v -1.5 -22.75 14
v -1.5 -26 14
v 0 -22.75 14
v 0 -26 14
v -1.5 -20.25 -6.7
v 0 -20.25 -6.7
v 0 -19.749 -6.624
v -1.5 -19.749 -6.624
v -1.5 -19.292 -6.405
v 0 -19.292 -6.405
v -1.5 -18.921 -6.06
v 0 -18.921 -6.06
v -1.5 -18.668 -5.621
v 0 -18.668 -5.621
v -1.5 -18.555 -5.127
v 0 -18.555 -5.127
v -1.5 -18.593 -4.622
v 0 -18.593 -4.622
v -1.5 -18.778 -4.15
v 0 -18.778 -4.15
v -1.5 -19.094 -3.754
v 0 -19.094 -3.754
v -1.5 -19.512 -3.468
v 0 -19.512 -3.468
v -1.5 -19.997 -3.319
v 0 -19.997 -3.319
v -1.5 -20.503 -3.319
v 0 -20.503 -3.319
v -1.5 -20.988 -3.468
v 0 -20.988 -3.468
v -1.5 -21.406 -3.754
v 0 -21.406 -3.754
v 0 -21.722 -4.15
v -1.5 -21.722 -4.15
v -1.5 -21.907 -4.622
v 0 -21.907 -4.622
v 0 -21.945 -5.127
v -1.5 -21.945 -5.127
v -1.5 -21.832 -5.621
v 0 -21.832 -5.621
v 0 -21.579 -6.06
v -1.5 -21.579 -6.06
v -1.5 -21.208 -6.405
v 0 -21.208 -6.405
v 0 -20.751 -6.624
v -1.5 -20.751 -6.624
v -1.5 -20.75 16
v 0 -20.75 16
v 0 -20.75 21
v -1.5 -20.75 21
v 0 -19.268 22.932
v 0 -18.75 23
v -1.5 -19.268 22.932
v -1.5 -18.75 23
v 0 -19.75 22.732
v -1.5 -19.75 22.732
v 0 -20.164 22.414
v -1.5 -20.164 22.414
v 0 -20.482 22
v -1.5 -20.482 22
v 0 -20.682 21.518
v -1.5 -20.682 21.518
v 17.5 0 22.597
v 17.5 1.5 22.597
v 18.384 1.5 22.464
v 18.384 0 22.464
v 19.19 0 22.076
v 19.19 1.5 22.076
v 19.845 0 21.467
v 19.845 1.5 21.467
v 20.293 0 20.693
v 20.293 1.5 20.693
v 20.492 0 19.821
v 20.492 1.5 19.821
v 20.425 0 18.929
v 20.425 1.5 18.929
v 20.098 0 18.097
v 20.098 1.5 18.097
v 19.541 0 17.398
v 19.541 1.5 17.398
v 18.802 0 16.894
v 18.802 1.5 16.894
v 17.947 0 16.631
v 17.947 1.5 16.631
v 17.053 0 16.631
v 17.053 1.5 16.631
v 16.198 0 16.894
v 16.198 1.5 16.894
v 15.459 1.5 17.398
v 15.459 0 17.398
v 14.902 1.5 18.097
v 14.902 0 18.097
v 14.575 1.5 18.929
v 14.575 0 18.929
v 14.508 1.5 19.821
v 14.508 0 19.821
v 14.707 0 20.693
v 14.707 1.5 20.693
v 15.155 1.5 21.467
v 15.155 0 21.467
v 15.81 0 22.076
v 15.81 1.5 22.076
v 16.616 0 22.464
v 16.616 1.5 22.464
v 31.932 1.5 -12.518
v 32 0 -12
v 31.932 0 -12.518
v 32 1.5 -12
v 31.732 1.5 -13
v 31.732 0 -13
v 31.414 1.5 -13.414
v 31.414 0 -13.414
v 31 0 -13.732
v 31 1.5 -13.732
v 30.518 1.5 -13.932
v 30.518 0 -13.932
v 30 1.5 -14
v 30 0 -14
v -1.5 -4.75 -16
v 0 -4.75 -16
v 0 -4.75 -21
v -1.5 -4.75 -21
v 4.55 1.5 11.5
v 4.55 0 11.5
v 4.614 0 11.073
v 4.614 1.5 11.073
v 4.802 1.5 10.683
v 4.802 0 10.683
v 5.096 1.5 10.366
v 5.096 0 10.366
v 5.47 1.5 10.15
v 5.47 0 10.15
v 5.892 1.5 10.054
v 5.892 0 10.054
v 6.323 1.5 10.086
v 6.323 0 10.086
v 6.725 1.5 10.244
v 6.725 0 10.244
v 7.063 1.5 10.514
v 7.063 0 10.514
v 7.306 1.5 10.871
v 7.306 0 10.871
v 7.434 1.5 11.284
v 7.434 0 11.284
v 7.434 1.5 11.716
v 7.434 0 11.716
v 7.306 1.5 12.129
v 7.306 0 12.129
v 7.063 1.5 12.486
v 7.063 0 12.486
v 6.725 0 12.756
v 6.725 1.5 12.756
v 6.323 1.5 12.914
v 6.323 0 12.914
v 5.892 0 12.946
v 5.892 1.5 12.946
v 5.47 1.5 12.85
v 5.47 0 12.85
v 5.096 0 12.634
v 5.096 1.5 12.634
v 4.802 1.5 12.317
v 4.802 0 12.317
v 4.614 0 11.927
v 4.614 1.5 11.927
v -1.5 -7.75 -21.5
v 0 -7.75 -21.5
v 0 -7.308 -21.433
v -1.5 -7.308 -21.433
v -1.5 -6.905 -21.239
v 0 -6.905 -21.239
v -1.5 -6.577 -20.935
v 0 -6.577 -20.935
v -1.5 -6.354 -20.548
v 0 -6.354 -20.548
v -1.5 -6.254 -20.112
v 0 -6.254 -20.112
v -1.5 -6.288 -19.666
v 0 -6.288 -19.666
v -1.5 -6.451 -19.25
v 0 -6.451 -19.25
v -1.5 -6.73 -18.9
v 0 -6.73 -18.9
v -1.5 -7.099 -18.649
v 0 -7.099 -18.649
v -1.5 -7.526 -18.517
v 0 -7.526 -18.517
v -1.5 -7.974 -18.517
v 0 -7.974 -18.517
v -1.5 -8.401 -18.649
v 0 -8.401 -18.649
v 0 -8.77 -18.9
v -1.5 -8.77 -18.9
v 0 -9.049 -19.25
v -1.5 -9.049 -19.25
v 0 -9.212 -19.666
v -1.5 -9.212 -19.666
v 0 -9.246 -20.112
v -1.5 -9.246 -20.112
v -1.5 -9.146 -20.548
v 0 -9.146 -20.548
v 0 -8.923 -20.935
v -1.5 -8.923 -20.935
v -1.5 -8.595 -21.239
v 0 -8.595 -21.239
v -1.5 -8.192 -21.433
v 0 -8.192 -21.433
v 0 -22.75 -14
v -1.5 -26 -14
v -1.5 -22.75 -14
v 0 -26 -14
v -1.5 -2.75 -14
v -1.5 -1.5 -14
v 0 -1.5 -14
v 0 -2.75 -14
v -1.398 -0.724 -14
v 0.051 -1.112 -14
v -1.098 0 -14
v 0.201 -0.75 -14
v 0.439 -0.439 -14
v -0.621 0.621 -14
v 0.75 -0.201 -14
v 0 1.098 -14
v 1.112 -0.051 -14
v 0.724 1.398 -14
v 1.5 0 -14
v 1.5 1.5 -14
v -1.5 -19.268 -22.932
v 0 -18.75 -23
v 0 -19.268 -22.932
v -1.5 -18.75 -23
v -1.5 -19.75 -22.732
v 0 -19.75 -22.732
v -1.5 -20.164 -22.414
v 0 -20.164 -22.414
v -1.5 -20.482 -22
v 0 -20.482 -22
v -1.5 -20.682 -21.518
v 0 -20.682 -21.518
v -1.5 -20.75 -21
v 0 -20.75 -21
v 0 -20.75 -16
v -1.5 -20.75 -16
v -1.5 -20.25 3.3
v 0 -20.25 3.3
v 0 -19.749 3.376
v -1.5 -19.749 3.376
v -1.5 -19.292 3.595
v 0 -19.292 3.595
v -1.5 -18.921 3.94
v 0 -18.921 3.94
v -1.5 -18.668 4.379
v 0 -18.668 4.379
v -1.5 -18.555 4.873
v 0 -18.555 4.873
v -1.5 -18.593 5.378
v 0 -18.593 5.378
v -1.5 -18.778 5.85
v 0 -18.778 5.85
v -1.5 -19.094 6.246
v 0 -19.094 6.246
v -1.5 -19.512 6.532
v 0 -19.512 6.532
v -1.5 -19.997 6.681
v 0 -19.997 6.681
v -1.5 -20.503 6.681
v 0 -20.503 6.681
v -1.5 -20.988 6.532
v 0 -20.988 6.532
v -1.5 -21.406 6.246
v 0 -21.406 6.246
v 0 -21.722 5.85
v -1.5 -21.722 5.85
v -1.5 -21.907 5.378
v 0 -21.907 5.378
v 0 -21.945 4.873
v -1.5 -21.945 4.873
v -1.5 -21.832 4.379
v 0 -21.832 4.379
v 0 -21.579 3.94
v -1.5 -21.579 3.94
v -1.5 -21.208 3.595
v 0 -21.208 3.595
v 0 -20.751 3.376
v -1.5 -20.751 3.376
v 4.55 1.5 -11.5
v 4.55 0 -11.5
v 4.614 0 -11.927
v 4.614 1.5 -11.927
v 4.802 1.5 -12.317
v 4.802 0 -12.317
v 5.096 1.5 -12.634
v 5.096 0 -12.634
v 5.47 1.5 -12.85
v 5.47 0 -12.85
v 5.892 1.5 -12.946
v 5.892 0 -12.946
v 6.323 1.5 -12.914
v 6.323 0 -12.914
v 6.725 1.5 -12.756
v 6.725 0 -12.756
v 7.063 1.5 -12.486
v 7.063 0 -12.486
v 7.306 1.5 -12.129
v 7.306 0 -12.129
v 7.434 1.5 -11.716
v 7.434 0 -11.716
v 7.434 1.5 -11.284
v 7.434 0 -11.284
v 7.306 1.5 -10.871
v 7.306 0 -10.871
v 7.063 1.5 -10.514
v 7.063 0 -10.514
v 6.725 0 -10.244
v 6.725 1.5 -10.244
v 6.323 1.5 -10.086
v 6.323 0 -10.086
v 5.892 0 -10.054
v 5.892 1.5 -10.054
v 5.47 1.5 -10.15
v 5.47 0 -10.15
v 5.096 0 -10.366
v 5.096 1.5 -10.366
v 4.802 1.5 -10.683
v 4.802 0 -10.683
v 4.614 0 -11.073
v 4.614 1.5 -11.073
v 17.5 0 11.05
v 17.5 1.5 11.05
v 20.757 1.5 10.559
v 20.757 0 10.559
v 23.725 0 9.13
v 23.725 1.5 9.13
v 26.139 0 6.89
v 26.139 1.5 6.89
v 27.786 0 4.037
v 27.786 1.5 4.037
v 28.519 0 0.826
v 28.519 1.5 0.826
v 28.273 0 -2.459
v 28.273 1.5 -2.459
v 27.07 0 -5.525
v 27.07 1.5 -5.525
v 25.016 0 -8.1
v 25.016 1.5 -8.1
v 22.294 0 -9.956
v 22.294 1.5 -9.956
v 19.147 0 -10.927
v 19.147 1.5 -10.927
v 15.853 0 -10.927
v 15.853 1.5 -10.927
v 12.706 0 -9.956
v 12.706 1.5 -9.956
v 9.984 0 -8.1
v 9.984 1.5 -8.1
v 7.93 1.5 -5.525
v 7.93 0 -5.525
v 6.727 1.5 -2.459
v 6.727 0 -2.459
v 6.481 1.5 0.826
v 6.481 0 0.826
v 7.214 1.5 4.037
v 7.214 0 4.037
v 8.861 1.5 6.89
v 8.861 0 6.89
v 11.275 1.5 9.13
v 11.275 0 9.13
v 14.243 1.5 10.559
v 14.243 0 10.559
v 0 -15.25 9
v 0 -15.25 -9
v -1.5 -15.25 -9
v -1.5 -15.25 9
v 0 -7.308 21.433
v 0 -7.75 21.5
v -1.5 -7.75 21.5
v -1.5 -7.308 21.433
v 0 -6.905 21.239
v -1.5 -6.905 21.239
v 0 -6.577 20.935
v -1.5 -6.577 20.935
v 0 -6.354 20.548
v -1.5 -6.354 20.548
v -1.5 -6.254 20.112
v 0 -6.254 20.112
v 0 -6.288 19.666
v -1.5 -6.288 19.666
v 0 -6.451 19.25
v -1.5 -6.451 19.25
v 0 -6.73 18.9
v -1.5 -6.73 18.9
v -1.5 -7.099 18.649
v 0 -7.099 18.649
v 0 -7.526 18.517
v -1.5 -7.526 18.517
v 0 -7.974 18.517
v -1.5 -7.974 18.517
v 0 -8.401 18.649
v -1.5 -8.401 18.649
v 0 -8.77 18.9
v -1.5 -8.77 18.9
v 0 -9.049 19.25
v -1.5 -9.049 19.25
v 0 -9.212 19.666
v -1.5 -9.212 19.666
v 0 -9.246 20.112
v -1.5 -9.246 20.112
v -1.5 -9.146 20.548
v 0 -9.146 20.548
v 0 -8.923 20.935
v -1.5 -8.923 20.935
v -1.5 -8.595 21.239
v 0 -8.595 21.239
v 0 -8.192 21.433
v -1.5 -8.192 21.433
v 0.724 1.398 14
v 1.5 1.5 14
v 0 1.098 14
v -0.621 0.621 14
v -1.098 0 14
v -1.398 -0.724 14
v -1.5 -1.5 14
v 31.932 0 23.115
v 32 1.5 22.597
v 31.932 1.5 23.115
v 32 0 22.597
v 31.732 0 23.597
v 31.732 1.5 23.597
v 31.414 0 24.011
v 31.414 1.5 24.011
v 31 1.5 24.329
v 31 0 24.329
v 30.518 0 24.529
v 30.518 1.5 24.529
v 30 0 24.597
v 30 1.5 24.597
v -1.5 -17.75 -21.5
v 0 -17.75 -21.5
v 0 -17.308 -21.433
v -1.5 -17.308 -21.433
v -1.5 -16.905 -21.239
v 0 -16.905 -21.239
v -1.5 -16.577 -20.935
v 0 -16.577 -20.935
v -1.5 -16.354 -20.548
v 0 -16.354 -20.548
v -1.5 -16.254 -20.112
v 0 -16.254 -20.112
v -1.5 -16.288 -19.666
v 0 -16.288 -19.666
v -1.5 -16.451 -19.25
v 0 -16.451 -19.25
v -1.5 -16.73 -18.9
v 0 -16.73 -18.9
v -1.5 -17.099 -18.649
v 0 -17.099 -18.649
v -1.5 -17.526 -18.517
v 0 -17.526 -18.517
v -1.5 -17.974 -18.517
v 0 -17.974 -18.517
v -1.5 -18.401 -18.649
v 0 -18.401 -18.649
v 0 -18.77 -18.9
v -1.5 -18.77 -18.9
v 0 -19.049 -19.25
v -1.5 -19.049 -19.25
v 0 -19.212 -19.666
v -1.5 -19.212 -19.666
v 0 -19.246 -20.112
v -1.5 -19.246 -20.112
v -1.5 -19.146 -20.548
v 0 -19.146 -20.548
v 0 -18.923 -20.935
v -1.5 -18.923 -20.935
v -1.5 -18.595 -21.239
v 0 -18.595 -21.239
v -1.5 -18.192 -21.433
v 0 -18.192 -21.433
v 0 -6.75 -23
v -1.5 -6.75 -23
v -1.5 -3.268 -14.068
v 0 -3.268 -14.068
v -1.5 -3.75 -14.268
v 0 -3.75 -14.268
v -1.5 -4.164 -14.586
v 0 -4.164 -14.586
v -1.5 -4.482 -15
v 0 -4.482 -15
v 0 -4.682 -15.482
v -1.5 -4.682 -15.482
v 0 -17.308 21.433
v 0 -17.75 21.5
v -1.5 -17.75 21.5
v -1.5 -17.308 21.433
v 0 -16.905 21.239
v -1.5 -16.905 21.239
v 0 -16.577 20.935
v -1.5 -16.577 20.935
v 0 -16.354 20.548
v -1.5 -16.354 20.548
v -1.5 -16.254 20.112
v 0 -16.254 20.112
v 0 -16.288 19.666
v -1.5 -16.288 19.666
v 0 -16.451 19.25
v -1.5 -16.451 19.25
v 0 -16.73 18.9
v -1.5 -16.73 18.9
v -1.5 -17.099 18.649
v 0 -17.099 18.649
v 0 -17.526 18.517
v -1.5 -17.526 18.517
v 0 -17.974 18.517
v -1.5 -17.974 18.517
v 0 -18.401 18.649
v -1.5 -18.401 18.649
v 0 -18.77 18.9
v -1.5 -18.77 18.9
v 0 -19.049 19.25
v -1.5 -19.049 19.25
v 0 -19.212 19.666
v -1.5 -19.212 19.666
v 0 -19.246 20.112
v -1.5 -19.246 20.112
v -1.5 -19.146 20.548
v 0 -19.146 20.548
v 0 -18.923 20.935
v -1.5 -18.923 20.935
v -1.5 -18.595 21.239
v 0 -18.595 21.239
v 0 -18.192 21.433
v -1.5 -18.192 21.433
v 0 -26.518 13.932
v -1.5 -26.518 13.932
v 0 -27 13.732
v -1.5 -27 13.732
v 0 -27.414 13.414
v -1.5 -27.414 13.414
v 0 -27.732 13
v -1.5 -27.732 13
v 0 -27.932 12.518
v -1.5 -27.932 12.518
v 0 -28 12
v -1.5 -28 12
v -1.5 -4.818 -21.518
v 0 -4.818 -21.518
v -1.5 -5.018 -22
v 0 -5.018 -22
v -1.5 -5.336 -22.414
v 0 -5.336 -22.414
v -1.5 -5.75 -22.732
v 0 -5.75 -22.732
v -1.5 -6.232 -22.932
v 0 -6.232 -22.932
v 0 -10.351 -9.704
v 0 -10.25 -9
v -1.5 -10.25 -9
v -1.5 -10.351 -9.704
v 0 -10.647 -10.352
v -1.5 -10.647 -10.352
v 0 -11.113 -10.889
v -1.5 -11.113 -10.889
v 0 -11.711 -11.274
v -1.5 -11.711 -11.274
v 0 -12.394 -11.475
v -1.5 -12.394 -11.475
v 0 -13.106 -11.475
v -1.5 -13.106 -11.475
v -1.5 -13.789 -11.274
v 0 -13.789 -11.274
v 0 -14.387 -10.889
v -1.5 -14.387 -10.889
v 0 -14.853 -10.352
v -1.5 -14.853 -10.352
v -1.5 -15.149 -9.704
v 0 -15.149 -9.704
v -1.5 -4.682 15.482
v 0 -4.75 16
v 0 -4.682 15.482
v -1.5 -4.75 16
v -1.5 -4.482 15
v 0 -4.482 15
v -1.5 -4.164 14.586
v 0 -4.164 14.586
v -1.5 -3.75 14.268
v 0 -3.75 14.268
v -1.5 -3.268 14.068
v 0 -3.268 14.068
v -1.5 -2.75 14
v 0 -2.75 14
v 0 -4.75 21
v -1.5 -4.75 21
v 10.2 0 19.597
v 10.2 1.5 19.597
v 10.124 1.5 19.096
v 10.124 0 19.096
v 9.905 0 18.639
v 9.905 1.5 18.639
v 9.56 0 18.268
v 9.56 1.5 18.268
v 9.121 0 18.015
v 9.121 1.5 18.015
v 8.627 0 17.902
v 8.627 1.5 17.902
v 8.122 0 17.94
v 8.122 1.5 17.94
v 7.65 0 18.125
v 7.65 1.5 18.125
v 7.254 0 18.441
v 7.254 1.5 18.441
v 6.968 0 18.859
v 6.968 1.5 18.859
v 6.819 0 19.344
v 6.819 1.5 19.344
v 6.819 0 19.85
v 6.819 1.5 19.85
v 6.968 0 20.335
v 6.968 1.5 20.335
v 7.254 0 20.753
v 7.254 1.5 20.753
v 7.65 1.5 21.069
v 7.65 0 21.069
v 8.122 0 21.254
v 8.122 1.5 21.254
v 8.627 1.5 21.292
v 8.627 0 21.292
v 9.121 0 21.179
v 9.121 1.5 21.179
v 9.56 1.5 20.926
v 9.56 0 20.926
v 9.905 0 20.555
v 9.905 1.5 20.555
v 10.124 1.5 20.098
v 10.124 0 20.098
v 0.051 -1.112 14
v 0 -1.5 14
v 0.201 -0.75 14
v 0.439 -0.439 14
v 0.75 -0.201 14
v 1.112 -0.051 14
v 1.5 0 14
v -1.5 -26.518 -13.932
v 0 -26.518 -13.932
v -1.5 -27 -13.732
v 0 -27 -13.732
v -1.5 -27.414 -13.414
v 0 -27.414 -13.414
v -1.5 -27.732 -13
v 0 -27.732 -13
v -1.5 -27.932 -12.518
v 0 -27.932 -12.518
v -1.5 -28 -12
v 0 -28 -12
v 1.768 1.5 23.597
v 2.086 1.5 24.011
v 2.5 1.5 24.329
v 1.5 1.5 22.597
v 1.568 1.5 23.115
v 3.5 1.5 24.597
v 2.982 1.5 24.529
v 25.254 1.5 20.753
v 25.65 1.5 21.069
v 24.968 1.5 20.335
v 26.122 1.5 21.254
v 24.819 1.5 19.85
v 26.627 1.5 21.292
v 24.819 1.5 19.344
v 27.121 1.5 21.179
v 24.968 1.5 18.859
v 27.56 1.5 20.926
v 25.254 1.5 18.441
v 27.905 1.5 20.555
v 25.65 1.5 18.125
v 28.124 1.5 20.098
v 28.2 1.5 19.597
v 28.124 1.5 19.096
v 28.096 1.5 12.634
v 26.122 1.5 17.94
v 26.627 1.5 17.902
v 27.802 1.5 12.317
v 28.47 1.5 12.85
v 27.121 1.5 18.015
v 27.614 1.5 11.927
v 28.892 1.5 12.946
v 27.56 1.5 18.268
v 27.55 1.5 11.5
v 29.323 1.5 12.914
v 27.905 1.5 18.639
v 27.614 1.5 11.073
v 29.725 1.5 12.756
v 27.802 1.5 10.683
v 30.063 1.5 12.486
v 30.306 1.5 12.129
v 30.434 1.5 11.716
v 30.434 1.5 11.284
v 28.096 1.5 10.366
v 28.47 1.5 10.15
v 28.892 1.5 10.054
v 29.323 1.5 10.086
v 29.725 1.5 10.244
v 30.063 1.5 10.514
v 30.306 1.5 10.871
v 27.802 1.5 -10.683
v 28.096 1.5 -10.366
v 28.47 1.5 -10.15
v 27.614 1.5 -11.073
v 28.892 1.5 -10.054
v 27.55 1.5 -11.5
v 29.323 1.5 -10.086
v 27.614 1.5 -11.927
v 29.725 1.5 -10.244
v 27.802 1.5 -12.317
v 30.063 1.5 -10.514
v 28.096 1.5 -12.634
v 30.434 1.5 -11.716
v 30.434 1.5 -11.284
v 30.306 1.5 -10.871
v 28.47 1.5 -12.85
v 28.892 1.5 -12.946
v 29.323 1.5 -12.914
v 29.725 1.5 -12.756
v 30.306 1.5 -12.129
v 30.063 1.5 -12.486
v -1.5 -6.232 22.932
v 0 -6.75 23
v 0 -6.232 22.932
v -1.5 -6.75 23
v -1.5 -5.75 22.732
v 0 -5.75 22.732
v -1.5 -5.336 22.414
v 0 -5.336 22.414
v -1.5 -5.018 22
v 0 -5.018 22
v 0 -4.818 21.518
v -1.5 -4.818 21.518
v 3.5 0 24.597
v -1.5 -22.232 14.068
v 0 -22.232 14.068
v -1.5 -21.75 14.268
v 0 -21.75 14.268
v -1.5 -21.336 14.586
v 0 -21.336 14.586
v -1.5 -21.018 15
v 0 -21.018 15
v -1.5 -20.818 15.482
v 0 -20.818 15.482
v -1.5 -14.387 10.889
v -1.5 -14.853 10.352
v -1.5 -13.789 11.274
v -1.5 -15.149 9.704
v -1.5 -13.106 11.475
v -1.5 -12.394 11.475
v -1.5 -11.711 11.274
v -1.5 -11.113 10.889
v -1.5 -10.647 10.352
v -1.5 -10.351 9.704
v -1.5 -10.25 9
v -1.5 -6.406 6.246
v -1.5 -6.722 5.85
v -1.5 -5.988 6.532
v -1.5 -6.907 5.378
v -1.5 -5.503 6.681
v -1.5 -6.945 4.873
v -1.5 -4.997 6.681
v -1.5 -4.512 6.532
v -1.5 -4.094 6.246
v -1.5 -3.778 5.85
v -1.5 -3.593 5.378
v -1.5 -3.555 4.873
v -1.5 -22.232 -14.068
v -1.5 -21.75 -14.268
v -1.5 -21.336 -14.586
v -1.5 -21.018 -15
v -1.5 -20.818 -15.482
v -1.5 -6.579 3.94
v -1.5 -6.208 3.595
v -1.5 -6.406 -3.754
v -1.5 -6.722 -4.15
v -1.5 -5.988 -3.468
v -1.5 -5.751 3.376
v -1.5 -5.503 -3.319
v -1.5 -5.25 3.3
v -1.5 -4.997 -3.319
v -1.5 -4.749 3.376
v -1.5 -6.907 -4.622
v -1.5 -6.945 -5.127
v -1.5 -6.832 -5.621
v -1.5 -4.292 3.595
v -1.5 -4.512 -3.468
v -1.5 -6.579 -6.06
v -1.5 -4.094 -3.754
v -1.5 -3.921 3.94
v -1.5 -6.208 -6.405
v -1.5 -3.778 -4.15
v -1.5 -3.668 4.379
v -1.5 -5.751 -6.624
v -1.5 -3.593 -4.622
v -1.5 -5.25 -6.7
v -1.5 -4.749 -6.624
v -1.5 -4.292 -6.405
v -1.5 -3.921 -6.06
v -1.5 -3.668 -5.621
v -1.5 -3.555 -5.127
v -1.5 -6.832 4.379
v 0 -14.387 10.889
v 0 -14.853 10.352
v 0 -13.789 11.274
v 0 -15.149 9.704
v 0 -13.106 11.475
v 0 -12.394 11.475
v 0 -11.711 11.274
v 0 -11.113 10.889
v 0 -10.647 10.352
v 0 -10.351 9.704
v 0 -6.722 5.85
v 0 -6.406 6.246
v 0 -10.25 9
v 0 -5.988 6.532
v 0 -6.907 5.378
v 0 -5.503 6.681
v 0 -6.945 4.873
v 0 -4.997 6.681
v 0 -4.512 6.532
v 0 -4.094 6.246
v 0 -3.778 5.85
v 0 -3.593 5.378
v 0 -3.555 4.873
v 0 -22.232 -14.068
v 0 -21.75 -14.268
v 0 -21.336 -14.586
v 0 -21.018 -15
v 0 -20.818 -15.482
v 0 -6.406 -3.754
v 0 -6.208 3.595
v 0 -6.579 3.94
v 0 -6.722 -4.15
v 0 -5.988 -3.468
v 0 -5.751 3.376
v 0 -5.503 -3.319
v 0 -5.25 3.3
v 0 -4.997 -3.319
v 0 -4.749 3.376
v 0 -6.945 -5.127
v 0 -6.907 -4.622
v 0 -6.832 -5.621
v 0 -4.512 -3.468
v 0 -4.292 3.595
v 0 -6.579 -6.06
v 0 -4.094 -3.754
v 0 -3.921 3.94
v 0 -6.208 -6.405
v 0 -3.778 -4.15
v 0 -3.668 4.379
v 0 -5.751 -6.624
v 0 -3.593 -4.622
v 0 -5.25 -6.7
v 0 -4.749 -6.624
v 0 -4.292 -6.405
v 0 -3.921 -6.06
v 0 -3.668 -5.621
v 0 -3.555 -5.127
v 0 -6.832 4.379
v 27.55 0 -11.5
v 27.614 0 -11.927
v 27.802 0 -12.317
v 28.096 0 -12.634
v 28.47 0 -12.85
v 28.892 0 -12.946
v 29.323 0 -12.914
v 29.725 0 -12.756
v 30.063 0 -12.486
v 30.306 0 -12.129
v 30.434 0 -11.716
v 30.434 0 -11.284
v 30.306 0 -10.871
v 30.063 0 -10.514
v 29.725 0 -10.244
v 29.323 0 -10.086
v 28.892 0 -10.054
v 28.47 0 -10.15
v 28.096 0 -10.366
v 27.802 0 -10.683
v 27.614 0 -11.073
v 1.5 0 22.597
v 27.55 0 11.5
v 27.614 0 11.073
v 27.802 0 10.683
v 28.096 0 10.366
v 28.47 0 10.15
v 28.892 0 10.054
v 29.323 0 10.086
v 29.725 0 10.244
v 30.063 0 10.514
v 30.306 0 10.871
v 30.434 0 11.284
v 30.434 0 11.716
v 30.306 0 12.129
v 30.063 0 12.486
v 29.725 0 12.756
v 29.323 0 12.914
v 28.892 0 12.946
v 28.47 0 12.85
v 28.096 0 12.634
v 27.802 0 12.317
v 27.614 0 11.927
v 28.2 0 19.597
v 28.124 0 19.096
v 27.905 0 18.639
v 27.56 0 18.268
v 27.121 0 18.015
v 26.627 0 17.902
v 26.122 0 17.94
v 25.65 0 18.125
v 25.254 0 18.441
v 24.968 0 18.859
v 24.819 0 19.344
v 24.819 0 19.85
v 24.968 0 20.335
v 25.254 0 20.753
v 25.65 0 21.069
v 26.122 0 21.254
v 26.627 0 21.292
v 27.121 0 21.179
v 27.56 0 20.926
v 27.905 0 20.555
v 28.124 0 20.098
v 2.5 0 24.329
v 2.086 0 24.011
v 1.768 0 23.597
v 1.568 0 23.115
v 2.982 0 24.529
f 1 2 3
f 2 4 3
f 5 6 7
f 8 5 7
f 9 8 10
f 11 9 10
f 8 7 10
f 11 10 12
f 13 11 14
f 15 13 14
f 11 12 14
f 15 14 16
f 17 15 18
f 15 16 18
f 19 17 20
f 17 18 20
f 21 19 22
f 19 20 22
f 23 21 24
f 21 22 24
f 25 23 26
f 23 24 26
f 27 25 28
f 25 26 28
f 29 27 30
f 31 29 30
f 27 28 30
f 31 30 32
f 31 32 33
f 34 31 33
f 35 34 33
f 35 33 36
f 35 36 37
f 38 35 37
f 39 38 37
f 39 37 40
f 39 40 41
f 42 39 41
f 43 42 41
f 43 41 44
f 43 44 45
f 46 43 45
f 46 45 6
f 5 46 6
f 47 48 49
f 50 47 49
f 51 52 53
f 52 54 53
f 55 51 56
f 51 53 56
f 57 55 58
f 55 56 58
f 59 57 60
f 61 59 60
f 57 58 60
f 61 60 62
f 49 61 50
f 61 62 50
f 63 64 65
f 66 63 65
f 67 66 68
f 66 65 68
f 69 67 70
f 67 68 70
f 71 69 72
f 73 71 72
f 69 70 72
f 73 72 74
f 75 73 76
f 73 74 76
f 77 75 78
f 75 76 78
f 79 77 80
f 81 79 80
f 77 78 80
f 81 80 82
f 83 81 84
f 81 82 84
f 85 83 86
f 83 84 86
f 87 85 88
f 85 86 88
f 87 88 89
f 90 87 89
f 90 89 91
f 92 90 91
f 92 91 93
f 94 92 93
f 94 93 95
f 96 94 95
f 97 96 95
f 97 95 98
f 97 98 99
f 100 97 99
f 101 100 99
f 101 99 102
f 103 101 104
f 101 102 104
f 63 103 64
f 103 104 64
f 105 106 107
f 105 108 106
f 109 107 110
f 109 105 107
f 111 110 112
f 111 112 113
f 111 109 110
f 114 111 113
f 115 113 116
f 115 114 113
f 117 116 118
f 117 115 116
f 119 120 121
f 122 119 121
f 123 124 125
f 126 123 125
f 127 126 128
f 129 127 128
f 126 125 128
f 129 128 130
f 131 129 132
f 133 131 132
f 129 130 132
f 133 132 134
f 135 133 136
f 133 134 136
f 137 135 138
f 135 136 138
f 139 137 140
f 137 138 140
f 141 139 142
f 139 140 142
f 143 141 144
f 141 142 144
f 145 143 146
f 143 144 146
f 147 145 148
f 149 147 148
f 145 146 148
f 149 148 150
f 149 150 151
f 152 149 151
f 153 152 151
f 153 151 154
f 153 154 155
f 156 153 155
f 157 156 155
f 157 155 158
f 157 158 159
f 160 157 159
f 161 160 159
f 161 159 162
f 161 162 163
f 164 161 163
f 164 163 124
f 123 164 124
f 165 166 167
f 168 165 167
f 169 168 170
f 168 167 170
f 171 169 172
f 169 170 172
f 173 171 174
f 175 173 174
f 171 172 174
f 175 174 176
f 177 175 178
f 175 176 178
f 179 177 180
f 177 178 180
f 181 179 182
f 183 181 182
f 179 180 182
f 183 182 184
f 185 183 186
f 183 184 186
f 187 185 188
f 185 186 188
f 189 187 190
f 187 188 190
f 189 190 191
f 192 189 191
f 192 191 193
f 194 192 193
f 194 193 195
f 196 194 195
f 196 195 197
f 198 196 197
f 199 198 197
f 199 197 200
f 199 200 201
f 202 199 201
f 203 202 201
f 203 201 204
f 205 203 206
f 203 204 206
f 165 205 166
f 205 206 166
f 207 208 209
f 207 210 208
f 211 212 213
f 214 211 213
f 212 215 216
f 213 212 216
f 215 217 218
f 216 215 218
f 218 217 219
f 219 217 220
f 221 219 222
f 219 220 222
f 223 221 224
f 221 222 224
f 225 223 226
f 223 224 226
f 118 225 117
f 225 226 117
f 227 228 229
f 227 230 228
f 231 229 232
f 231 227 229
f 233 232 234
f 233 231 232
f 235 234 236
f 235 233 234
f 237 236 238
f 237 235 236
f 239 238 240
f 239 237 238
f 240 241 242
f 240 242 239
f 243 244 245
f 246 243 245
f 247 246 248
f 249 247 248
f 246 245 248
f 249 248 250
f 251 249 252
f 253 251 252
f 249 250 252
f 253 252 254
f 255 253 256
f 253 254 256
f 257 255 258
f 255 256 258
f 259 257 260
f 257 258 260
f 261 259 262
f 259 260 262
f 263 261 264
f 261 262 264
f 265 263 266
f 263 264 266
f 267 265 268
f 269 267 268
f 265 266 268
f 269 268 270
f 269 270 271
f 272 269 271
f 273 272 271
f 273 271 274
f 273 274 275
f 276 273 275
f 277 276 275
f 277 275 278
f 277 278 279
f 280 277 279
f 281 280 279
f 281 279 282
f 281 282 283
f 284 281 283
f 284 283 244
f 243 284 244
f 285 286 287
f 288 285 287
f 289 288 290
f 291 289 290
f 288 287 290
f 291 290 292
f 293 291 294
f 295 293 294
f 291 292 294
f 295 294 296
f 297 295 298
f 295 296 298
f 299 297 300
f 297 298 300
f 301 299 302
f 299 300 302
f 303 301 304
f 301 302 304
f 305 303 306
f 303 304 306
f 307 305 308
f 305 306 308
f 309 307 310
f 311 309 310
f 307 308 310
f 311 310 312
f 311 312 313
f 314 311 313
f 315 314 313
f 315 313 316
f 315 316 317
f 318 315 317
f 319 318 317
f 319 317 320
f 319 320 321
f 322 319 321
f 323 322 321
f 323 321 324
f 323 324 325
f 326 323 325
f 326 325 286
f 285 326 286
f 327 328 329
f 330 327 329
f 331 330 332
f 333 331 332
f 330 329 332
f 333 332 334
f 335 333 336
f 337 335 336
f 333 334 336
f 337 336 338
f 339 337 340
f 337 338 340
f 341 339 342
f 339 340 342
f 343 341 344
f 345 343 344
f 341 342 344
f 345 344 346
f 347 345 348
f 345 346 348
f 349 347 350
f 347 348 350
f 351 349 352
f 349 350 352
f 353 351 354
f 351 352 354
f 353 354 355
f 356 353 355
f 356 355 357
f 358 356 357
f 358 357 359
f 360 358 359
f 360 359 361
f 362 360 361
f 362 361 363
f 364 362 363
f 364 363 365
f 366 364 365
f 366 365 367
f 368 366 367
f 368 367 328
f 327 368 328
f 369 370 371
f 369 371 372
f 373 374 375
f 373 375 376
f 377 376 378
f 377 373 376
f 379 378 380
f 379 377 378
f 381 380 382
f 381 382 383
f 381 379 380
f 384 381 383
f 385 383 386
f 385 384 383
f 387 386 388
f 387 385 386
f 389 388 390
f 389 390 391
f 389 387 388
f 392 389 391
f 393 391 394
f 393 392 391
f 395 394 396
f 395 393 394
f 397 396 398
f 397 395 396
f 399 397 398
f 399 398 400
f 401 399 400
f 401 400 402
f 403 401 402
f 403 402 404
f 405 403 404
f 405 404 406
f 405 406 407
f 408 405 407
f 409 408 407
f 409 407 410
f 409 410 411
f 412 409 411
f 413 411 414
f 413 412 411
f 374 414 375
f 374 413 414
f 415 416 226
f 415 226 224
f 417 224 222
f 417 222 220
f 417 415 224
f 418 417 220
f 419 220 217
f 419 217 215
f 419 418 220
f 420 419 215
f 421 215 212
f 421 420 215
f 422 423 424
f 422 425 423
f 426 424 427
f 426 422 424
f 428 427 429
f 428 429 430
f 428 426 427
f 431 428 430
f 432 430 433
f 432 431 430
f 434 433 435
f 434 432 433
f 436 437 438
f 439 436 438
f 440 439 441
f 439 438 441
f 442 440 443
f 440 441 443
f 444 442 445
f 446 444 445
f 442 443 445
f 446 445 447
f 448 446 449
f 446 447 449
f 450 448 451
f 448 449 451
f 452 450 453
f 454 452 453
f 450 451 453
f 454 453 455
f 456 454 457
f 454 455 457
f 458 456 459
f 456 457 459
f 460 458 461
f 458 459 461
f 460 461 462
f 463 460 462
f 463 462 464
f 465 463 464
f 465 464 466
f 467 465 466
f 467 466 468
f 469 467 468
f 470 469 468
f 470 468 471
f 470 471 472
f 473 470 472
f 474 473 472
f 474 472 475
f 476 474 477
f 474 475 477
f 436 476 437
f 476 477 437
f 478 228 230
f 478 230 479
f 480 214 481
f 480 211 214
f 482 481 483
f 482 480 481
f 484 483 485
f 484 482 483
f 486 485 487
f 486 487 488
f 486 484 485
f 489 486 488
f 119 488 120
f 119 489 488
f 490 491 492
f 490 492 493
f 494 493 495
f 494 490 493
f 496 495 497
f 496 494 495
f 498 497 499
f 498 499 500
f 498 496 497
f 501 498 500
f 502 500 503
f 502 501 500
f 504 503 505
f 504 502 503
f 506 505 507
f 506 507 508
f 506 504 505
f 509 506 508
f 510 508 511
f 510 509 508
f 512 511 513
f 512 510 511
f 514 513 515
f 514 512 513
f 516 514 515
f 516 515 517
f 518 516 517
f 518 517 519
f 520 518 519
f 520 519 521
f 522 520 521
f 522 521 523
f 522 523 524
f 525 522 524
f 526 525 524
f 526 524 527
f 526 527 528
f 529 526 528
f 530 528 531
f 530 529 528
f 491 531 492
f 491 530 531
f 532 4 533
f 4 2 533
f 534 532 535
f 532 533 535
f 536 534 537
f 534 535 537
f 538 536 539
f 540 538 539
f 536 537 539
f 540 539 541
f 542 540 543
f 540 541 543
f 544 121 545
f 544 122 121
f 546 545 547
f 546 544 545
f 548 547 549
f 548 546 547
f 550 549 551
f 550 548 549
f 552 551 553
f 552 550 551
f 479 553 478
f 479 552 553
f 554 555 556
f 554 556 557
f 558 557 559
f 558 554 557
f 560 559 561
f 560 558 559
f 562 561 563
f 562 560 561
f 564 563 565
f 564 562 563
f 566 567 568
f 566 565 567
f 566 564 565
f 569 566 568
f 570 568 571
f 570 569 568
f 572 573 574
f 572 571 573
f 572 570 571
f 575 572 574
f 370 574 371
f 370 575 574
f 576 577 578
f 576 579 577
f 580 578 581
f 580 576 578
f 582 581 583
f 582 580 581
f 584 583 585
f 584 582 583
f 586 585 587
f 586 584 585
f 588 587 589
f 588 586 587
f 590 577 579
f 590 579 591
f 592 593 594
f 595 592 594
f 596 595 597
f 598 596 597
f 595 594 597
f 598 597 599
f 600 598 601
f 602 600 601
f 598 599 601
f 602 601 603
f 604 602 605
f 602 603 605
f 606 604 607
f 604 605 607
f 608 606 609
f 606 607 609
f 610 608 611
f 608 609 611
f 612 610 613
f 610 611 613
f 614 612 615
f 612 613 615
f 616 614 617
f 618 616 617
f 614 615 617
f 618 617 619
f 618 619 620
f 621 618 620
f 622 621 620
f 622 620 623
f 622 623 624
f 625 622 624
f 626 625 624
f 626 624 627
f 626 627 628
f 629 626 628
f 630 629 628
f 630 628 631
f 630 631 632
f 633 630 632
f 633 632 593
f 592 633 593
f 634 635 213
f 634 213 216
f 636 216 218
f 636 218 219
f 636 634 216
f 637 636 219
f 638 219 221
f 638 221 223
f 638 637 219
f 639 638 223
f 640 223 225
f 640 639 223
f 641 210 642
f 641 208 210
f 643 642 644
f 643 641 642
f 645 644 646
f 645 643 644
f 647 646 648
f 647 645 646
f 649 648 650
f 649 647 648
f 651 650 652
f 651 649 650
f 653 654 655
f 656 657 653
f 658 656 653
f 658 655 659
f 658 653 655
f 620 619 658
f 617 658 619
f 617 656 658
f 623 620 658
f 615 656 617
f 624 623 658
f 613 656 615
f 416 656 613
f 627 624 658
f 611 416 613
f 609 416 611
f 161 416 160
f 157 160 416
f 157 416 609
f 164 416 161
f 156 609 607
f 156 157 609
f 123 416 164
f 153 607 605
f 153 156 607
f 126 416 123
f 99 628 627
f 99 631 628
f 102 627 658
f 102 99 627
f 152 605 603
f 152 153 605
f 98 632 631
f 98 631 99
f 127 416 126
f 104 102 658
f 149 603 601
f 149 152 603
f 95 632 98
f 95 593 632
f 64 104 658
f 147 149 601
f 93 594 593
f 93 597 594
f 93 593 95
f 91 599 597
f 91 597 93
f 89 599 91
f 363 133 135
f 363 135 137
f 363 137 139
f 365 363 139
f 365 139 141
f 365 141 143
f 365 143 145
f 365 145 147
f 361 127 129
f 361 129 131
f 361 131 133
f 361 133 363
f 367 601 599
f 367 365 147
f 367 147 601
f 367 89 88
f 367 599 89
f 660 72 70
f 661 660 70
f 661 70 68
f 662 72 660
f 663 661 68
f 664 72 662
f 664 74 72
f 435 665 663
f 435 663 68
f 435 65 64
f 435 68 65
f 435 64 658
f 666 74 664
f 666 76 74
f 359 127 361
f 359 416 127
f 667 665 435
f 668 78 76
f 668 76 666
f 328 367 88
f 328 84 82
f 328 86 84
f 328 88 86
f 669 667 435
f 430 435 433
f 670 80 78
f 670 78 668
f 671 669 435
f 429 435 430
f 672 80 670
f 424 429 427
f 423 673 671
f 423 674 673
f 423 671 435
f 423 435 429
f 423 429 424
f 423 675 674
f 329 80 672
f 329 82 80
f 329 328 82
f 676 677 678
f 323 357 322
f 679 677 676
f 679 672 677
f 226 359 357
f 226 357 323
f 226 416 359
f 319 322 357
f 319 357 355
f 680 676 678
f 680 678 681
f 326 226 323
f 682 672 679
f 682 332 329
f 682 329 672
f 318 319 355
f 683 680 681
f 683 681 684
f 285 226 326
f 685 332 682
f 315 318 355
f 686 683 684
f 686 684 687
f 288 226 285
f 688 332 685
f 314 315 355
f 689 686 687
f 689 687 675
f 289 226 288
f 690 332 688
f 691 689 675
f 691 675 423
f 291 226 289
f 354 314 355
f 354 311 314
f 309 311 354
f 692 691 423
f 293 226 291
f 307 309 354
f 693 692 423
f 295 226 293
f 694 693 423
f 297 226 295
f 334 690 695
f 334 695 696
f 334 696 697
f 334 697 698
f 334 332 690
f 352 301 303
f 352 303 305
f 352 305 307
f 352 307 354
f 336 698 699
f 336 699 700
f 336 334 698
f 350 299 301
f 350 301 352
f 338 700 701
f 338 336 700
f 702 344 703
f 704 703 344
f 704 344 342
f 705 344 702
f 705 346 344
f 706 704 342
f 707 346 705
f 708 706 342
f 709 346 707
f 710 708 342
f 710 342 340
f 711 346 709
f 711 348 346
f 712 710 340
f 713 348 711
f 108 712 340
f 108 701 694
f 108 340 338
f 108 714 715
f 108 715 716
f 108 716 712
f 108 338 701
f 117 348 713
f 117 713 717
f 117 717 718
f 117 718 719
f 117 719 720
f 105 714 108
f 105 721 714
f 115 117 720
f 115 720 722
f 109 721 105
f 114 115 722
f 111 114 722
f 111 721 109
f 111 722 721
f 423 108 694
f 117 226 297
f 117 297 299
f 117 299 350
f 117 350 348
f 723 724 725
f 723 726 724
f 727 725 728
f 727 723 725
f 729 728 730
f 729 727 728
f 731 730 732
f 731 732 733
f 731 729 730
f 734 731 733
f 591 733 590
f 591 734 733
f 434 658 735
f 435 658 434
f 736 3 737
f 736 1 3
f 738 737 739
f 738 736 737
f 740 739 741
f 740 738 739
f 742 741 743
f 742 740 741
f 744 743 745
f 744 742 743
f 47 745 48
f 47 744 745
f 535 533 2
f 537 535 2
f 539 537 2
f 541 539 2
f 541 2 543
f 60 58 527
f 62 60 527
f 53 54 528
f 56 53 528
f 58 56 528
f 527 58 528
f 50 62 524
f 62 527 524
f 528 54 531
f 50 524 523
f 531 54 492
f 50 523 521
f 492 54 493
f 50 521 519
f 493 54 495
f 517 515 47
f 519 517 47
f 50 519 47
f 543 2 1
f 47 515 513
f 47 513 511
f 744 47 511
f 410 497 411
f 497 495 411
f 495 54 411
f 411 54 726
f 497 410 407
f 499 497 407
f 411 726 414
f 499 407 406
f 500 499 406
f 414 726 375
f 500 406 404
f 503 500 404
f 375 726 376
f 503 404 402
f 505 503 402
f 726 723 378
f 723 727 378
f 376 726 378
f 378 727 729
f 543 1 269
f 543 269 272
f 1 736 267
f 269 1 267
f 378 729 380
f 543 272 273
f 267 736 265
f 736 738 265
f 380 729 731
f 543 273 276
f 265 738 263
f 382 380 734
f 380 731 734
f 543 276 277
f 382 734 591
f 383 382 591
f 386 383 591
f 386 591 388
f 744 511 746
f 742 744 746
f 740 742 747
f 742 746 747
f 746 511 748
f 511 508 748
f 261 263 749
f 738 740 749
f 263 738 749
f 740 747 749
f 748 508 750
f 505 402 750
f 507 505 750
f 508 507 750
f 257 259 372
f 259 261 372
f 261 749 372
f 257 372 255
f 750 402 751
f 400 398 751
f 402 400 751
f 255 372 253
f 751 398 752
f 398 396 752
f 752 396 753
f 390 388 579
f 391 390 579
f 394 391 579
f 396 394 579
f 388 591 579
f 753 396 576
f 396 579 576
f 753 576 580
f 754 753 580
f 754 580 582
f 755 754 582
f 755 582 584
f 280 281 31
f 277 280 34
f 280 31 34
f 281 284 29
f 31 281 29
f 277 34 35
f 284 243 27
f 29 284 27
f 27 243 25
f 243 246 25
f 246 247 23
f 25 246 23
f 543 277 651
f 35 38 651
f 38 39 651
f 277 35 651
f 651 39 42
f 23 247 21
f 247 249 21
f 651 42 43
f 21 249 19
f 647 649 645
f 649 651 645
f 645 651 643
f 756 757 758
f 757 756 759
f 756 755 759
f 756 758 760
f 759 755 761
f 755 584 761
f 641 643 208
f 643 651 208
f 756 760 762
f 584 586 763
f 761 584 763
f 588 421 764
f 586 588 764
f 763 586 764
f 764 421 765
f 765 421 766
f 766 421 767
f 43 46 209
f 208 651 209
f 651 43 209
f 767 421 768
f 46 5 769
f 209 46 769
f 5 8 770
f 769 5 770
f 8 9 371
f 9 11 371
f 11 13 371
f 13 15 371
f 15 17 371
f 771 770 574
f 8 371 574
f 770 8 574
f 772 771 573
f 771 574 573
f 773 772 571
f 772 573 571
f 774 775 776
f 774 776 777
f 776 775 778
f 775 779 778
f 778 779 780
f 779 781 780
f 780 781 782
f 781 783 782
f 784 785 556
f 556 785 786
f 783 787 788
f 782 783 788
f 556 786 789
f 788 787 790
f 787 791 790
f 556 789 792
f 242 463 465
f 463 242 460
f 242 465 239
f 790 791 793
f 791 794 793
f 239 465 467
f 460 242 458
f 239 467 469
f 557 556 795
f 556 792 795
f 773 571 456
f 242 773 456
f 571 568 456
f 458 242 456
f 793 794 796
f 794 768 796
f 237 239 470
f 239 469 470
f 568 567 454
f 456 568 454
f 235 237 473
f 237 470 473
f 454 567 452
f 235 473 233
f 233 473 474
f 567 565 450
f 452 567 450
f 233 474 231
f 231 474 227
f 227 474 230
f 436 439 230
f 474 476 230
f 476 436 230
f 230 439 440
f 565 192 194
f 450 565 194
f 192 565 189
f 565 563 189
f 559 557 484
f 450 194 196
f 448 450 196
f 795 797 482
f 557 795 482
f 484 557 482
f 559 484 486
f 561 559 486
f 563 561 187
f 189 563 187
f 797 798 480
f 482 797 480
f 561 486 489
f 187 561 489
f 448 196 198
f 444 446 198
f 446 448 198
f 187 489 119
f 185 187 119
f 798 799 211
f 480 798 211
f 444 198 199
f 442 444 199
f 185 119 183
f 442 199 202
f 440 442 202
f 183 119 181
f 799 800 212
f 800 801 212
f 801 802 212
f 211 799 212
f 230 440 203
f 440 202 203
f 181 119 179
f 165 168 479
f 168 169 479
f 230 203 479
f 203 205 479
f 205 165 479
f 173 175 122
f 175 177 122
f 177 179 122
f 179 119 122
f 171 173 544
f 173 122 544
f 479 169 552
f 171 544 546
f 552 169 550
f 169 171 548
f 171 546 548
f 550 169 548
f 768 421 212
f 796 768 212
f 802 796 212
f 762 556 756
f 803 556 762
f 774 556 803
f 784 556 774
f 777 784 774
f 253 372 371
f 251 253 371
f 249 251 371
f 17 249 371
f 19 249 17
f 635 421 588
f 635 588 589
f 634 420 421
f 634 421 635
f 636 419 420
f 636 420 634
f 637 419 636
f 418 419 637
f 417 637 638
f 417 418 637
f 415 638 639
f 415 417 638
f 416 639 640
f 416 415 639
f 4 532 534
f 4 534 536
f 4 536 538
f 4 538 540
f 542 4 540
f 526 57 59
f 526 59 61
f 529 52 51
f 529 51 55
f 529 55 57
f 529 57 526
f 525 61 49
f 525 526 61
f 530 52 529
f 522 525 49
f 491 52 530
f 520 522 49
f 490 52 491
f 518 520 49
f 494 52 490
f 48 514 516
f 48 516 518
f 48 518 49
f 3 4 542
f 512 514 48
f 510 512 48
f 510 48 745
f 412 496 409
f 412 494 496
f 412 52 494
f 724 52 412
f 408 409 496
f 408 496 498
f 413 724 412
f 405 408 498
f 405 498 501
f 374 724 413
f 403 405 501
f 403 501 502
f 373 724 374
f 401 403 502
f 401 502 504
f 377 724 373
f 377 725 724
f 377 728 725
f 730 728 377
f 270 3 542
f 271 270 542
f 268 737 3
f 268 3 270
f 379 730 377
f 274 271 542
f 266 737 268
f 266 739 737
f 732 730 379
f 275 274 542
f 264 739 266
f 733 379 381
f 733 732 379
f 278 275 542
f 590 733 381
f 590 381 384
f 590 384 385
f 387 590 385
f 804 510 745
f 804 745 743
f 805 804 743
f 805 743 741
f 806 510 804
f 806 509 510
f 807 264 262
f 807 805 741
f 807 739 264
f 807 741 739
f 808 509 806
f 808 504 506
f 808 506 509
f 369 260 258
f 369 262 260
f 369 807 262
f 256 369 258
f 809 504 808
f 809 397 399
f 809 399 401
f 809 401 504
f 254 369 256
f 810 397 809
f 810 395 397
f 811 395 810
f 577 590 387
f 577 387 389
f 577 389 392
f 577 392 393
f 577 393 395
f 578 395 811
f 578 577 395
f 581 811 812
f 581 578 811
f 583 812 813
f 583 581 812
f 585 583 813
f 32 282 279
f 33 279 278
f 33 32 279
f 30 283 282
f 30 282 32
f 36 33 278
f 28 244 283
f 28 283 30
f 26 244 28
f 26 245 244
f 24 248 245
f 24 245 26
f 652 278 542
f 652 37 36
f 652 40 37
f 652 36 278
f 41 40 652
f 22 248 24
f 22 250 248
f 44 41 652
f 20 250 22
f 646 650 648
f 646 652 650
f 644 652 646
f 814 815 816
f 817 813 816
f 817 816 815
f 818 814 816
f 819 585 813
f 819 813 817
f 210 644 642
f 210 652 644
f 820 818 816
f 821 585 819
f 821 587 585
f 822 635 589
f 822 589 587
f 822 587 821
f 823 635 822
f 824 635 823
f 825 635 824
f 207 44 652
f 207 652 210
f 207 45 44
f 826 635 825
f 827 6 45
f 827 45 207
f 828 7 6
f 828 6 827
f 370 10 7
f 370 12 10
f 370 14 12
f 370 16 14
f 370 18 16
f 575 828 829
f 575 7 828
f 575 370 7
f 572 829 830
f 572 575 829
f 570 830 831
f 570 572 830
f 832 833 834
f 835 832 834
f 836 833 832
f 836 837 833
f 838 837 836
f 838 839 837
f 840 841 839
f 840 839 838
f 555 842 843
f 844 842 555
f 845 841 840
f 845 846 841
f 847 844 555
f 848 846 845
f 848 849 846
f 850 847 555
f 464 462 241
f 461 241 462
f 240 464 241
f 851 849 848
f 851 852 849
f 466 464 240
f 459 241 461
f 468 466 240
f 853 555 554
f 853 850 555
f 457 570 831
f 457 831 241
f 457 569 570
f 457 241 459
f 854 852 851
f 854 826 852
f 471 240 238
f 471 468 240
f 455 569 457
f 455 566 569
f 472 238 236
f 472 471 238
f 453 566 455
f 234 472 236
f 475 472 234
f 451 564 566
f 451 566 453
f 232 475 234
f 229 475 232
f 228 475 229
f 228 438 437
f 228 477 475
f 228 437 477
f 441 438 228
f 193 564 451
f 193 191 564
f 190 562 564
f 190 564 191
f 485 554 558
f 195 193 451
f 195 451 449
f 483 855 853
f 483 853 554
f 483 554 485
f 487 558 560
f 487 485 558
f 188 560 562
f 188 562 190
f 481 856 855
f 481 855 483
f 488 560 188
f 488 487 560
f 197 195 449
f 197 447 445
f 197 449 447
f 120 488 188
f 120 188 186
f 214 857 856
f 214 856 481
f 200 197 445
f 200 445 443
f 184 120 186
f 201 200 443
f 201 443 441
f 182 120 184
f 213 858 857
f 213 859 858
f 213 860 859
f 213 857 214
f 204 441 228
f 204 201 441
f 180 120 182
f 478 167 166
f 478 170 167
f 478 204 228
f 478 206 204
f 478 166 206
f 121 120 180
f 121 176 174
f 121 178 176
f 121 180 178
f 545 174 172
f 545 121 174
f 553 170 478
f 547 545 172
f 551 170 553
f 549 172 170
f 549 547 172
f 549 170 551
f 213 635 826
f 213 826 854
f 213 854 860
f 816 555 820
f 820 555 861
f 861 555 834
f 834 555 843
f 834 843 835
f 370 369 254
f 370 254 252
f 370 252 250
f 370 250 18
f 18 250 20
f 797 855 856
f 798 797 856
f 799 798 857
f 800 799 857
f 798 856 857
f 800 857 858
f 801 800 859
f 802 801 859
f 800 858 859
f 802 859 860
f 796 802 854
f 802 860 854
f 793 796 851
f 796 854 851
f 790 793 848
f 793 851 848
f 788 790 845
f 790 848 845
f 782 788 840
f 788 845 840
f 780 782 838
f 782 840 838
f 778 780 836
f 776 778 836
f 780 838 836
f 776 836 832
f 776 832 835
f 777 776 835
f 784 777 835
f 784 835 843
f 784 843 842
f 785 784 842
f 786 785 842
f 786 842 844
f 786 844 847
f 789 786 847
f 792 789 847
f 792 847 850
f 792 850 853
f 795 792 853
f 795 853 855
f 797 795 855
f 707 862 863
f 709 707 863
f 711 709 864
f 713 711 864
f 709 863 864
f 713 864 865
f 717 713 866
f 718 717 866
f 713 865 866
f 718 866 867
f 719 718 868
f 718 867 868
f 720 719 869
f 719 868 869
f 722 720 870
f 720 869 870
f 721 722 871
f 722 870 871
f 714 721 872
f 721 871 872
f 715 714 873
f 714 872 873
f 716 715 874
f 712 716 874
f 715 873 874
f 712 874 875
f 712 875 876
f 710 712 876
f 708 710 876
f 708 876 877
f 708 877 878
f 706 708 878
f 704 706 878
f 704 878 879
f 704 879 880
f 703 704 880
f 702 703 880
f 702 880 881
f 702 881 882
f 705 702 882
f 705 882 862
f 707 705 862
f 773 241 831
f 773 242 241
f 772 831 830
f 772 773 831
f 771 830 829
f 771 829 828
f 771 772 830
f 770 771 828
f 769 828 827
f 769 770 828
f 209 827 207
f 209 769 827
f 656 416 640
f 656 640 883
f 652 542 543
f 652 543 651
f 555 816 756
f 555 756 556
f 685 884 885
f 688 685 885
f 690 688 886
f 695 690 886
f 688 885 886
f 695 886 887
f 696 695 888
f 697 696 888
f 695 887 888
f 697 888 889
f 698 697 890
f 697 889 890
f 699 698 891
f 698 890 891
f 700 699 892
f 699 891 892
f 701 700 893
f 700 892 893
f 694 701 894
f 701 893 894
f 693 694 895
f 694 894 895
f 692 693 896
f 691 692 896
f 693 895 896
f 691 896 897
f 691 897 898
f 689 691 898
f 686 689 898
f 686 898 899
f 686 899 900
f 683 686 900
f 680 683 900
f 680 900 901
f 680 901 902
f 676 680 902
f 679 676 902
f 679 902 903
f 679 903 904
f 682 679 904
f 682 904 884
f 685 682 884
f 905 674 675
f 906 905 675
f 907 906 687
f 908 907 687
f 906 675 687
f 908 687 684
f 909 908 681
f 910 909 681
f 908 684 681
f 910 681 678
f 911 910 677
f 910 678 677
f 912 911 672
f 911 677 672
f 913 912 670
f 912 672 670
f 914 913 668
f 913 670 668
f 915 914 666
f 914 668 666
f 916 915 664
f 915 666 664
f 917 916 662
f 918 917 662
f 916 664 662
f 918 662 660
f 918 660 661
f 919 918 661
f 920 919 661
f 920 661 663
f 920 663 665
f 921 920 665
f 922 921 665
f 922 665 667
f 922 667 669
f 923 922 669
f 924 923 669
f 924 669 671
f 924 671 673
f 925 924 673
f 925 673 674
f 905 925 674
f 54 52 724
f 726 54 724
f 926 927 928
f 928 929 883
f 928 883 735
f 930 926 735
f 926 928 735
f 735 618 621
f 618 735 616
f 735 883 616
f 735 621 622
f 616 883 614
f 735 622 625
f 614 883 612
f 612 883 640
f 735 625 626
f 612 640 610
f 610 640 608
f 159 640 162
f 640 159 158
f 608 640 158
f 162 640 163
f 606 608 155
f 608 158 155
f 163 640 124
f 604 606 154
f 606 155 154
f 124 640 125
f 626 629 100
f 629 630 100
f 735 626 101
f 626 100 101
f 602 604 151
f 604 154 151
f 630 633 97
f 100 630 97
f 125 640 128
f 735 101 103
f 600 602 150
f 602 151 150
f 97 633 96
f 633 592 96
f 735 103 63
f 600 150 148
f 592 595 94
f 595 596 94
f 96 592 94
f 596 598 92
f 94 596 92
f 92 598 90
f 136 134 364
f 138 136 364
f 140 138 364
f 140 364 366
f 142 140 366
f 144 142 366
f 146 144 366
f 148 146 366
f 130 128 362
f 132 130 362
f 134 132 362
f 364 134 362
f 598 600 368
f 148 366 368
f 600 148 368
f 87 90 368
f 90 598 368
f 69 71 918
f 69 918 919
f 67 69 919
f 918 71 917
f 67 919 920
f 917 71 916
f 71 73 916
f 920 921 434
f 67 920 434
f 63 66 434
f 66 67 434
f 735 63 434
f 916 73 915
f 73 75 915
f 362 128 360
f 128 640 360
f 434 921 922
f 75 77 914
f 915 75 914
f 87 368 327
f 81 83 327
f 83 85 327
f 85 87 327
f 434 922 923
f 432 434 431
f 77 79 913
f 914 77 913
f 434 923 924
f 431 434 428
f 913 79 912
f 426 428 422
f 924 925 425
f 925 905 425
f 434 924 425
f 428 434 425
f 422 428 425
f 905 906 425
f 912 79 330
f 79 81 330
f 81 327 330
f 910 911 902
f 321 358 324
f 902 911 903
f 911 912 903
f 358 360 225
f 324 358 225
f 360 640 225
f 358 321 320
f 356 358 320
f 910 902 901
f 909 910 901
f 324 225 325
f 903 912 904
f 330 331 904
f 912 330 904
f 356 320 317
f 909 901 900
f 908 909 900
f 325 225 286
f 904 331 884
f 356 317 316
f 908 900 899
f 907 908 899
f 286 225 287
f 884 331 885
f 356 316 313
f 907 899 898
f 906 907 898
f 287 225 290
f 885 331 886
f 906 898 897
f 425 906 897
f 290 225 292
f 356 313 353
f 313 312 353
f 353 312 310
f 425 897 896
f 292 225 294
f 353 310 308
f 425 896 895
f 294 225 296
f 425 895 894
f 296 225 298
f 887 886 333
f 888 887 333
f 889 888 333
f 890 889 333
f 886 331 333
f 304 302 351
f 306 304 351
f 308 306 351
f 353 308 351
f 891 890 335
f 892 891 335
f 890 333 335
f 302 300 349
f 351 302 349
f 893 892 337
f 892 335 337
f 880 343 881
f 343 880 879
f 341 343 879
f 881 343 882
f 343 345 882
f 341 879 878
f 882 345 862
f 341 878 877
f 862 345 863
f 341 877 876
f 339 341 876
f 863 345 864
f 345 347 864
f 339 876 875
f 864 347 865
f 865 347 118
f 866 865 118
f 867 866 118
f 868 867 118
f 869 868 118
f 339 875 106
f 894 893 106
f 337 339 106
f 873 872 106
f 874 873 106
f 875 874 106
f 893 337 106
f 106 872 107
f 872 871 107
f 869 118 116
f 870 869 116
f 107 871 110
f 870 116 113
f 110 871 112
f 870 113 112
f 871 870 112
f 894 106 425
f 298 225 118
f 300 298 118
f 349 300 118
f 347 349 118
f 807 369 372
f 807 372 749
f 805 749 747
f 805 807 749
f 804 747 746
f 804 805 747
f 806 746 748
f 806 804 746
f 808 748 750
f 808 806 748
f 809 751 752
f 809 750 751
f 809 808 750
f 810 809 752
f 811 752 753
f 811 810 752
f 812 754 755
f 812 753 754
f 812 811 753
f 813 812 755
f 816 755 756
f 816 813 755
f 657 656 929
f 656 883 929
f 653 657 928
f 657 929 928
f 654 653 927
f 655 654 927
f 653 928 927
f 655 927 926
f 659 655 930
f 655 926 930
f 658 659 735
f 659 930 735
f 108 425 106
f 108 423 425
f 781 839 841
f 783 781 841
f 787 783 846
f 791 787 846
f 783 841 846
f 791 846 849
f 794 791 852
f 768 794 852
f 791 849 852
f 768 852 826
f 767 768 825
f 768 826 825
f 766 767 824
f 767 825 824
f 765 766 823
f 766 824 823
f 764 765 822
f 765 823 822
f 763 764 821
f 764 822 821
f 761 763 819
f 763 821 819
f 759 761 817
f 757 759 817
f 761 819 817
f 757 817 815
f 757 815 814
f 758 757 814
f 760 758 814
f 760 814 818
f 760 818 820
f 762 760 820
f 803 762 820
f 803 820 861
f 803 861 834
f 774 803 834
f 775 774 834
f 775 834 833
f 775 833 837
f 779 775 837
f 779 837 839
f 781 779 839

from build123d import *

# Parameters (mm, degrees)
BASE_FLANGE1_DEPTH     = 14
M3_CLEARANCE_HOLE1_D   = 3.4
M2_5_CLEARANCE_HOLE1_D = 2.9
SKETCH10_R             = 11.05
CUT_EXTRUDE1_DEPTH     = 10
SKETCH11_R             = 3
BOSS_EXTRUDE1_DEPTH    = 1.5
M3_CLEARANCE_HOLE2_D   = 3.4
SKETCH14_W             = 9
SKETCH14_H             = 16
SKETCH14_R             = 1.5
BOSS_EXTRUDE2_DEPTH    = 1.5
SKETCH15_W             = 28
SKETCH15_H             = 4
BOSS_EXTRUDE3_DEPTH    = 1.5
FILLET1_R              = 2
CUT_EXTRUDE2_DEPTH     = 10


# Sheet-metal steps are written as plain solids
with BuildPart() as part:
    # Sketch1 → Base-Flange1 (new, symmetric)
    with BuildSketch(Plane.XY):
        with BuildLine():
            Line((0, -24), (0, -1.5))
            ThreePointArc((0, -1.5), (0.439339828, -0.439339828), (1.5, 0))
            Line((1.5, 0), (32, 0))
            Line((32, 0), (32, 1.5))
            Line((32, 1.5), (1.5, 1.5))
            ThreePointArc((1.5, 1.5), (-0.621320344, 0.621320344), (-1.5, -1.5))
            Line((-1.5, -1.5), (-1.5, -24))
            Line((-1.5, -24), (0, -24))
        make_face()
    extrude(amount=BASE_FLANGE1_DEPTH, both=True)

    # M3 Clearance Hole1 (through all)
    with Locations(Plane.ZY.offset(1.5)):
        with Locations((-5, -5.25), (-5, -20.25), (5, -5.25), (5, -20.25)):
            Hole(M3_CLEARANCE_HOLE1_D / 2)

    # M2.5 Clearance Hole1 (through all)
    with Locations(Plane(origin=(0, 1.5, 0), x_dir=(1, 0, 0), z_dir=(0, 1, 0))):
        with Locations((29, 11.5), (29, -11.5), (6, -11.5), (6, 11.5)):
            Hole(M2_5_CLEARANCE_HOLE1_D / 2)

    # Sketch10 → Cut-Extrude1 (cut)
    with BuildSketch(Plane(origin=(0, 1.5, 0), x_dir=(1, 0, 0), z_dir=(0, 1, 0))):
        with Locations(Location((17.5, 0, 0), (0, 0, 270))):
            Circle(SKETCH10_R)
    extrude(amount=-CUT_EXTRUDE1_DEPTH, mode=Mode.SUBTRACT)

    # Sketch11 → Boss-Extrude1 (add)
    with BuildSketch(Plane(origin=(0, 1.5, 0), x_dir=(1, 0, 0), z_dir=(0, 1, 0))):
        Polygon((32, -14), (1.5, -14), (1.5, -24.597), (17.5, -24.597), (32, -24.597), align=None)
        with Locations(Location((17.5, -19.597, 0), (0, 0, 270))):
            Circle(SKETCH11_R, mode=Mode.SUBTRACT)
    extrude(amount=-BOSS_EXTRUDE1_DEPTH)

    # M3 Clearance Hole2 (through all)
    with Locations(Plane(origin=(0, 0, 0), x_dir=(-1, 0, 0), z_dir=(0, -1, 0))):
        with Locations((-26.5, -19.597), (-8.5, -19.597)):
            Hole(M3_CLEARANCE_HOLE2_D / 2)

    # Sketch14 → Boss-Extrude2 (add)
    with BuildSketch(Plane(origin=(0, 0, 0), x_dir=(0, 0, -1), z_dir=(1, 0, 0))):
        with Locations((18.5, -12.75)):
            Rectangle(SKETCH14_W, SKETCH14_H)
        with Locations((20, -7.75)):
            Circle(SKETCH14_R, mode=Mode.SUBTRACT)
        with Locations((20, -17.75)):
            Circle(SKETCH14_R, mode=Mode.SUBTRACT)
    boss_extrude2 = extrude(amount=-BOSS_EXTRUDE2_DEPTH)

    # Mirror1: Boss-Extrude2 across plane
    add(boss_extrude2.mirror(Plane.XY))

    # Sketch15 → Boss-Extrude3 (add)
    with BuildSketch(Plane(origin=(0, 0, 0), x_dir=(0, 0, -1), z_dir=(1, 0, 0))):
        with Locations((0, -26)):
            Rectangle(SKETCH15_W, SKETCH15_H)
    extrude(amount=-BOSS_EXTRUDE3_DEPTH)

    # Fillet1
    fillet1_edges = [part.edges().sort_by_distance(p)[0] for p in [
        (-0.75, -20.75, -14),
        (-0.75, -4.75, -14),
        (-0.75, -4.75, -23),
        (-0.75, -20.75, -23),
        (-0.75, -4.75, 14),
        (-0.75, -20.75, 14),
        (-0.75, -20.75, 23),
        (-0.75, -4.75, 23),
        (-0.75, -28, 14),
        (-0.75, -28, -14),
        (1.5, 0.75, 24.597),
        (32, 0.75, 24.597),
        (32, 0.75, -14),
    ]]
    fillet(fillet1_edges, radius=FILLET1_R)

    # Sketch16 → Cut-Extrude2 (cut)
    with BuildSketch(Plane(origin=(0, 0, 0), x_dir=(0, 0, -1), z_dir=(1, 0, 0))):
        with BuildLine():
            Line((-9, -10.25), (9, -10.25))
            ThreePointArc((9, -10.25), (11.5, -12.75), (9, -15.25))
            Line((9, -15.25), (-9, -15.25))
            ThreePointArc((-9, -15.25), (-11.5, -12.75), (-9, -10.25))
        make_face()
    extrude(amount=-CUT_EXTRUDE2_DEPTH, mode=Mode.SUBTRACT)


solid = part.part
